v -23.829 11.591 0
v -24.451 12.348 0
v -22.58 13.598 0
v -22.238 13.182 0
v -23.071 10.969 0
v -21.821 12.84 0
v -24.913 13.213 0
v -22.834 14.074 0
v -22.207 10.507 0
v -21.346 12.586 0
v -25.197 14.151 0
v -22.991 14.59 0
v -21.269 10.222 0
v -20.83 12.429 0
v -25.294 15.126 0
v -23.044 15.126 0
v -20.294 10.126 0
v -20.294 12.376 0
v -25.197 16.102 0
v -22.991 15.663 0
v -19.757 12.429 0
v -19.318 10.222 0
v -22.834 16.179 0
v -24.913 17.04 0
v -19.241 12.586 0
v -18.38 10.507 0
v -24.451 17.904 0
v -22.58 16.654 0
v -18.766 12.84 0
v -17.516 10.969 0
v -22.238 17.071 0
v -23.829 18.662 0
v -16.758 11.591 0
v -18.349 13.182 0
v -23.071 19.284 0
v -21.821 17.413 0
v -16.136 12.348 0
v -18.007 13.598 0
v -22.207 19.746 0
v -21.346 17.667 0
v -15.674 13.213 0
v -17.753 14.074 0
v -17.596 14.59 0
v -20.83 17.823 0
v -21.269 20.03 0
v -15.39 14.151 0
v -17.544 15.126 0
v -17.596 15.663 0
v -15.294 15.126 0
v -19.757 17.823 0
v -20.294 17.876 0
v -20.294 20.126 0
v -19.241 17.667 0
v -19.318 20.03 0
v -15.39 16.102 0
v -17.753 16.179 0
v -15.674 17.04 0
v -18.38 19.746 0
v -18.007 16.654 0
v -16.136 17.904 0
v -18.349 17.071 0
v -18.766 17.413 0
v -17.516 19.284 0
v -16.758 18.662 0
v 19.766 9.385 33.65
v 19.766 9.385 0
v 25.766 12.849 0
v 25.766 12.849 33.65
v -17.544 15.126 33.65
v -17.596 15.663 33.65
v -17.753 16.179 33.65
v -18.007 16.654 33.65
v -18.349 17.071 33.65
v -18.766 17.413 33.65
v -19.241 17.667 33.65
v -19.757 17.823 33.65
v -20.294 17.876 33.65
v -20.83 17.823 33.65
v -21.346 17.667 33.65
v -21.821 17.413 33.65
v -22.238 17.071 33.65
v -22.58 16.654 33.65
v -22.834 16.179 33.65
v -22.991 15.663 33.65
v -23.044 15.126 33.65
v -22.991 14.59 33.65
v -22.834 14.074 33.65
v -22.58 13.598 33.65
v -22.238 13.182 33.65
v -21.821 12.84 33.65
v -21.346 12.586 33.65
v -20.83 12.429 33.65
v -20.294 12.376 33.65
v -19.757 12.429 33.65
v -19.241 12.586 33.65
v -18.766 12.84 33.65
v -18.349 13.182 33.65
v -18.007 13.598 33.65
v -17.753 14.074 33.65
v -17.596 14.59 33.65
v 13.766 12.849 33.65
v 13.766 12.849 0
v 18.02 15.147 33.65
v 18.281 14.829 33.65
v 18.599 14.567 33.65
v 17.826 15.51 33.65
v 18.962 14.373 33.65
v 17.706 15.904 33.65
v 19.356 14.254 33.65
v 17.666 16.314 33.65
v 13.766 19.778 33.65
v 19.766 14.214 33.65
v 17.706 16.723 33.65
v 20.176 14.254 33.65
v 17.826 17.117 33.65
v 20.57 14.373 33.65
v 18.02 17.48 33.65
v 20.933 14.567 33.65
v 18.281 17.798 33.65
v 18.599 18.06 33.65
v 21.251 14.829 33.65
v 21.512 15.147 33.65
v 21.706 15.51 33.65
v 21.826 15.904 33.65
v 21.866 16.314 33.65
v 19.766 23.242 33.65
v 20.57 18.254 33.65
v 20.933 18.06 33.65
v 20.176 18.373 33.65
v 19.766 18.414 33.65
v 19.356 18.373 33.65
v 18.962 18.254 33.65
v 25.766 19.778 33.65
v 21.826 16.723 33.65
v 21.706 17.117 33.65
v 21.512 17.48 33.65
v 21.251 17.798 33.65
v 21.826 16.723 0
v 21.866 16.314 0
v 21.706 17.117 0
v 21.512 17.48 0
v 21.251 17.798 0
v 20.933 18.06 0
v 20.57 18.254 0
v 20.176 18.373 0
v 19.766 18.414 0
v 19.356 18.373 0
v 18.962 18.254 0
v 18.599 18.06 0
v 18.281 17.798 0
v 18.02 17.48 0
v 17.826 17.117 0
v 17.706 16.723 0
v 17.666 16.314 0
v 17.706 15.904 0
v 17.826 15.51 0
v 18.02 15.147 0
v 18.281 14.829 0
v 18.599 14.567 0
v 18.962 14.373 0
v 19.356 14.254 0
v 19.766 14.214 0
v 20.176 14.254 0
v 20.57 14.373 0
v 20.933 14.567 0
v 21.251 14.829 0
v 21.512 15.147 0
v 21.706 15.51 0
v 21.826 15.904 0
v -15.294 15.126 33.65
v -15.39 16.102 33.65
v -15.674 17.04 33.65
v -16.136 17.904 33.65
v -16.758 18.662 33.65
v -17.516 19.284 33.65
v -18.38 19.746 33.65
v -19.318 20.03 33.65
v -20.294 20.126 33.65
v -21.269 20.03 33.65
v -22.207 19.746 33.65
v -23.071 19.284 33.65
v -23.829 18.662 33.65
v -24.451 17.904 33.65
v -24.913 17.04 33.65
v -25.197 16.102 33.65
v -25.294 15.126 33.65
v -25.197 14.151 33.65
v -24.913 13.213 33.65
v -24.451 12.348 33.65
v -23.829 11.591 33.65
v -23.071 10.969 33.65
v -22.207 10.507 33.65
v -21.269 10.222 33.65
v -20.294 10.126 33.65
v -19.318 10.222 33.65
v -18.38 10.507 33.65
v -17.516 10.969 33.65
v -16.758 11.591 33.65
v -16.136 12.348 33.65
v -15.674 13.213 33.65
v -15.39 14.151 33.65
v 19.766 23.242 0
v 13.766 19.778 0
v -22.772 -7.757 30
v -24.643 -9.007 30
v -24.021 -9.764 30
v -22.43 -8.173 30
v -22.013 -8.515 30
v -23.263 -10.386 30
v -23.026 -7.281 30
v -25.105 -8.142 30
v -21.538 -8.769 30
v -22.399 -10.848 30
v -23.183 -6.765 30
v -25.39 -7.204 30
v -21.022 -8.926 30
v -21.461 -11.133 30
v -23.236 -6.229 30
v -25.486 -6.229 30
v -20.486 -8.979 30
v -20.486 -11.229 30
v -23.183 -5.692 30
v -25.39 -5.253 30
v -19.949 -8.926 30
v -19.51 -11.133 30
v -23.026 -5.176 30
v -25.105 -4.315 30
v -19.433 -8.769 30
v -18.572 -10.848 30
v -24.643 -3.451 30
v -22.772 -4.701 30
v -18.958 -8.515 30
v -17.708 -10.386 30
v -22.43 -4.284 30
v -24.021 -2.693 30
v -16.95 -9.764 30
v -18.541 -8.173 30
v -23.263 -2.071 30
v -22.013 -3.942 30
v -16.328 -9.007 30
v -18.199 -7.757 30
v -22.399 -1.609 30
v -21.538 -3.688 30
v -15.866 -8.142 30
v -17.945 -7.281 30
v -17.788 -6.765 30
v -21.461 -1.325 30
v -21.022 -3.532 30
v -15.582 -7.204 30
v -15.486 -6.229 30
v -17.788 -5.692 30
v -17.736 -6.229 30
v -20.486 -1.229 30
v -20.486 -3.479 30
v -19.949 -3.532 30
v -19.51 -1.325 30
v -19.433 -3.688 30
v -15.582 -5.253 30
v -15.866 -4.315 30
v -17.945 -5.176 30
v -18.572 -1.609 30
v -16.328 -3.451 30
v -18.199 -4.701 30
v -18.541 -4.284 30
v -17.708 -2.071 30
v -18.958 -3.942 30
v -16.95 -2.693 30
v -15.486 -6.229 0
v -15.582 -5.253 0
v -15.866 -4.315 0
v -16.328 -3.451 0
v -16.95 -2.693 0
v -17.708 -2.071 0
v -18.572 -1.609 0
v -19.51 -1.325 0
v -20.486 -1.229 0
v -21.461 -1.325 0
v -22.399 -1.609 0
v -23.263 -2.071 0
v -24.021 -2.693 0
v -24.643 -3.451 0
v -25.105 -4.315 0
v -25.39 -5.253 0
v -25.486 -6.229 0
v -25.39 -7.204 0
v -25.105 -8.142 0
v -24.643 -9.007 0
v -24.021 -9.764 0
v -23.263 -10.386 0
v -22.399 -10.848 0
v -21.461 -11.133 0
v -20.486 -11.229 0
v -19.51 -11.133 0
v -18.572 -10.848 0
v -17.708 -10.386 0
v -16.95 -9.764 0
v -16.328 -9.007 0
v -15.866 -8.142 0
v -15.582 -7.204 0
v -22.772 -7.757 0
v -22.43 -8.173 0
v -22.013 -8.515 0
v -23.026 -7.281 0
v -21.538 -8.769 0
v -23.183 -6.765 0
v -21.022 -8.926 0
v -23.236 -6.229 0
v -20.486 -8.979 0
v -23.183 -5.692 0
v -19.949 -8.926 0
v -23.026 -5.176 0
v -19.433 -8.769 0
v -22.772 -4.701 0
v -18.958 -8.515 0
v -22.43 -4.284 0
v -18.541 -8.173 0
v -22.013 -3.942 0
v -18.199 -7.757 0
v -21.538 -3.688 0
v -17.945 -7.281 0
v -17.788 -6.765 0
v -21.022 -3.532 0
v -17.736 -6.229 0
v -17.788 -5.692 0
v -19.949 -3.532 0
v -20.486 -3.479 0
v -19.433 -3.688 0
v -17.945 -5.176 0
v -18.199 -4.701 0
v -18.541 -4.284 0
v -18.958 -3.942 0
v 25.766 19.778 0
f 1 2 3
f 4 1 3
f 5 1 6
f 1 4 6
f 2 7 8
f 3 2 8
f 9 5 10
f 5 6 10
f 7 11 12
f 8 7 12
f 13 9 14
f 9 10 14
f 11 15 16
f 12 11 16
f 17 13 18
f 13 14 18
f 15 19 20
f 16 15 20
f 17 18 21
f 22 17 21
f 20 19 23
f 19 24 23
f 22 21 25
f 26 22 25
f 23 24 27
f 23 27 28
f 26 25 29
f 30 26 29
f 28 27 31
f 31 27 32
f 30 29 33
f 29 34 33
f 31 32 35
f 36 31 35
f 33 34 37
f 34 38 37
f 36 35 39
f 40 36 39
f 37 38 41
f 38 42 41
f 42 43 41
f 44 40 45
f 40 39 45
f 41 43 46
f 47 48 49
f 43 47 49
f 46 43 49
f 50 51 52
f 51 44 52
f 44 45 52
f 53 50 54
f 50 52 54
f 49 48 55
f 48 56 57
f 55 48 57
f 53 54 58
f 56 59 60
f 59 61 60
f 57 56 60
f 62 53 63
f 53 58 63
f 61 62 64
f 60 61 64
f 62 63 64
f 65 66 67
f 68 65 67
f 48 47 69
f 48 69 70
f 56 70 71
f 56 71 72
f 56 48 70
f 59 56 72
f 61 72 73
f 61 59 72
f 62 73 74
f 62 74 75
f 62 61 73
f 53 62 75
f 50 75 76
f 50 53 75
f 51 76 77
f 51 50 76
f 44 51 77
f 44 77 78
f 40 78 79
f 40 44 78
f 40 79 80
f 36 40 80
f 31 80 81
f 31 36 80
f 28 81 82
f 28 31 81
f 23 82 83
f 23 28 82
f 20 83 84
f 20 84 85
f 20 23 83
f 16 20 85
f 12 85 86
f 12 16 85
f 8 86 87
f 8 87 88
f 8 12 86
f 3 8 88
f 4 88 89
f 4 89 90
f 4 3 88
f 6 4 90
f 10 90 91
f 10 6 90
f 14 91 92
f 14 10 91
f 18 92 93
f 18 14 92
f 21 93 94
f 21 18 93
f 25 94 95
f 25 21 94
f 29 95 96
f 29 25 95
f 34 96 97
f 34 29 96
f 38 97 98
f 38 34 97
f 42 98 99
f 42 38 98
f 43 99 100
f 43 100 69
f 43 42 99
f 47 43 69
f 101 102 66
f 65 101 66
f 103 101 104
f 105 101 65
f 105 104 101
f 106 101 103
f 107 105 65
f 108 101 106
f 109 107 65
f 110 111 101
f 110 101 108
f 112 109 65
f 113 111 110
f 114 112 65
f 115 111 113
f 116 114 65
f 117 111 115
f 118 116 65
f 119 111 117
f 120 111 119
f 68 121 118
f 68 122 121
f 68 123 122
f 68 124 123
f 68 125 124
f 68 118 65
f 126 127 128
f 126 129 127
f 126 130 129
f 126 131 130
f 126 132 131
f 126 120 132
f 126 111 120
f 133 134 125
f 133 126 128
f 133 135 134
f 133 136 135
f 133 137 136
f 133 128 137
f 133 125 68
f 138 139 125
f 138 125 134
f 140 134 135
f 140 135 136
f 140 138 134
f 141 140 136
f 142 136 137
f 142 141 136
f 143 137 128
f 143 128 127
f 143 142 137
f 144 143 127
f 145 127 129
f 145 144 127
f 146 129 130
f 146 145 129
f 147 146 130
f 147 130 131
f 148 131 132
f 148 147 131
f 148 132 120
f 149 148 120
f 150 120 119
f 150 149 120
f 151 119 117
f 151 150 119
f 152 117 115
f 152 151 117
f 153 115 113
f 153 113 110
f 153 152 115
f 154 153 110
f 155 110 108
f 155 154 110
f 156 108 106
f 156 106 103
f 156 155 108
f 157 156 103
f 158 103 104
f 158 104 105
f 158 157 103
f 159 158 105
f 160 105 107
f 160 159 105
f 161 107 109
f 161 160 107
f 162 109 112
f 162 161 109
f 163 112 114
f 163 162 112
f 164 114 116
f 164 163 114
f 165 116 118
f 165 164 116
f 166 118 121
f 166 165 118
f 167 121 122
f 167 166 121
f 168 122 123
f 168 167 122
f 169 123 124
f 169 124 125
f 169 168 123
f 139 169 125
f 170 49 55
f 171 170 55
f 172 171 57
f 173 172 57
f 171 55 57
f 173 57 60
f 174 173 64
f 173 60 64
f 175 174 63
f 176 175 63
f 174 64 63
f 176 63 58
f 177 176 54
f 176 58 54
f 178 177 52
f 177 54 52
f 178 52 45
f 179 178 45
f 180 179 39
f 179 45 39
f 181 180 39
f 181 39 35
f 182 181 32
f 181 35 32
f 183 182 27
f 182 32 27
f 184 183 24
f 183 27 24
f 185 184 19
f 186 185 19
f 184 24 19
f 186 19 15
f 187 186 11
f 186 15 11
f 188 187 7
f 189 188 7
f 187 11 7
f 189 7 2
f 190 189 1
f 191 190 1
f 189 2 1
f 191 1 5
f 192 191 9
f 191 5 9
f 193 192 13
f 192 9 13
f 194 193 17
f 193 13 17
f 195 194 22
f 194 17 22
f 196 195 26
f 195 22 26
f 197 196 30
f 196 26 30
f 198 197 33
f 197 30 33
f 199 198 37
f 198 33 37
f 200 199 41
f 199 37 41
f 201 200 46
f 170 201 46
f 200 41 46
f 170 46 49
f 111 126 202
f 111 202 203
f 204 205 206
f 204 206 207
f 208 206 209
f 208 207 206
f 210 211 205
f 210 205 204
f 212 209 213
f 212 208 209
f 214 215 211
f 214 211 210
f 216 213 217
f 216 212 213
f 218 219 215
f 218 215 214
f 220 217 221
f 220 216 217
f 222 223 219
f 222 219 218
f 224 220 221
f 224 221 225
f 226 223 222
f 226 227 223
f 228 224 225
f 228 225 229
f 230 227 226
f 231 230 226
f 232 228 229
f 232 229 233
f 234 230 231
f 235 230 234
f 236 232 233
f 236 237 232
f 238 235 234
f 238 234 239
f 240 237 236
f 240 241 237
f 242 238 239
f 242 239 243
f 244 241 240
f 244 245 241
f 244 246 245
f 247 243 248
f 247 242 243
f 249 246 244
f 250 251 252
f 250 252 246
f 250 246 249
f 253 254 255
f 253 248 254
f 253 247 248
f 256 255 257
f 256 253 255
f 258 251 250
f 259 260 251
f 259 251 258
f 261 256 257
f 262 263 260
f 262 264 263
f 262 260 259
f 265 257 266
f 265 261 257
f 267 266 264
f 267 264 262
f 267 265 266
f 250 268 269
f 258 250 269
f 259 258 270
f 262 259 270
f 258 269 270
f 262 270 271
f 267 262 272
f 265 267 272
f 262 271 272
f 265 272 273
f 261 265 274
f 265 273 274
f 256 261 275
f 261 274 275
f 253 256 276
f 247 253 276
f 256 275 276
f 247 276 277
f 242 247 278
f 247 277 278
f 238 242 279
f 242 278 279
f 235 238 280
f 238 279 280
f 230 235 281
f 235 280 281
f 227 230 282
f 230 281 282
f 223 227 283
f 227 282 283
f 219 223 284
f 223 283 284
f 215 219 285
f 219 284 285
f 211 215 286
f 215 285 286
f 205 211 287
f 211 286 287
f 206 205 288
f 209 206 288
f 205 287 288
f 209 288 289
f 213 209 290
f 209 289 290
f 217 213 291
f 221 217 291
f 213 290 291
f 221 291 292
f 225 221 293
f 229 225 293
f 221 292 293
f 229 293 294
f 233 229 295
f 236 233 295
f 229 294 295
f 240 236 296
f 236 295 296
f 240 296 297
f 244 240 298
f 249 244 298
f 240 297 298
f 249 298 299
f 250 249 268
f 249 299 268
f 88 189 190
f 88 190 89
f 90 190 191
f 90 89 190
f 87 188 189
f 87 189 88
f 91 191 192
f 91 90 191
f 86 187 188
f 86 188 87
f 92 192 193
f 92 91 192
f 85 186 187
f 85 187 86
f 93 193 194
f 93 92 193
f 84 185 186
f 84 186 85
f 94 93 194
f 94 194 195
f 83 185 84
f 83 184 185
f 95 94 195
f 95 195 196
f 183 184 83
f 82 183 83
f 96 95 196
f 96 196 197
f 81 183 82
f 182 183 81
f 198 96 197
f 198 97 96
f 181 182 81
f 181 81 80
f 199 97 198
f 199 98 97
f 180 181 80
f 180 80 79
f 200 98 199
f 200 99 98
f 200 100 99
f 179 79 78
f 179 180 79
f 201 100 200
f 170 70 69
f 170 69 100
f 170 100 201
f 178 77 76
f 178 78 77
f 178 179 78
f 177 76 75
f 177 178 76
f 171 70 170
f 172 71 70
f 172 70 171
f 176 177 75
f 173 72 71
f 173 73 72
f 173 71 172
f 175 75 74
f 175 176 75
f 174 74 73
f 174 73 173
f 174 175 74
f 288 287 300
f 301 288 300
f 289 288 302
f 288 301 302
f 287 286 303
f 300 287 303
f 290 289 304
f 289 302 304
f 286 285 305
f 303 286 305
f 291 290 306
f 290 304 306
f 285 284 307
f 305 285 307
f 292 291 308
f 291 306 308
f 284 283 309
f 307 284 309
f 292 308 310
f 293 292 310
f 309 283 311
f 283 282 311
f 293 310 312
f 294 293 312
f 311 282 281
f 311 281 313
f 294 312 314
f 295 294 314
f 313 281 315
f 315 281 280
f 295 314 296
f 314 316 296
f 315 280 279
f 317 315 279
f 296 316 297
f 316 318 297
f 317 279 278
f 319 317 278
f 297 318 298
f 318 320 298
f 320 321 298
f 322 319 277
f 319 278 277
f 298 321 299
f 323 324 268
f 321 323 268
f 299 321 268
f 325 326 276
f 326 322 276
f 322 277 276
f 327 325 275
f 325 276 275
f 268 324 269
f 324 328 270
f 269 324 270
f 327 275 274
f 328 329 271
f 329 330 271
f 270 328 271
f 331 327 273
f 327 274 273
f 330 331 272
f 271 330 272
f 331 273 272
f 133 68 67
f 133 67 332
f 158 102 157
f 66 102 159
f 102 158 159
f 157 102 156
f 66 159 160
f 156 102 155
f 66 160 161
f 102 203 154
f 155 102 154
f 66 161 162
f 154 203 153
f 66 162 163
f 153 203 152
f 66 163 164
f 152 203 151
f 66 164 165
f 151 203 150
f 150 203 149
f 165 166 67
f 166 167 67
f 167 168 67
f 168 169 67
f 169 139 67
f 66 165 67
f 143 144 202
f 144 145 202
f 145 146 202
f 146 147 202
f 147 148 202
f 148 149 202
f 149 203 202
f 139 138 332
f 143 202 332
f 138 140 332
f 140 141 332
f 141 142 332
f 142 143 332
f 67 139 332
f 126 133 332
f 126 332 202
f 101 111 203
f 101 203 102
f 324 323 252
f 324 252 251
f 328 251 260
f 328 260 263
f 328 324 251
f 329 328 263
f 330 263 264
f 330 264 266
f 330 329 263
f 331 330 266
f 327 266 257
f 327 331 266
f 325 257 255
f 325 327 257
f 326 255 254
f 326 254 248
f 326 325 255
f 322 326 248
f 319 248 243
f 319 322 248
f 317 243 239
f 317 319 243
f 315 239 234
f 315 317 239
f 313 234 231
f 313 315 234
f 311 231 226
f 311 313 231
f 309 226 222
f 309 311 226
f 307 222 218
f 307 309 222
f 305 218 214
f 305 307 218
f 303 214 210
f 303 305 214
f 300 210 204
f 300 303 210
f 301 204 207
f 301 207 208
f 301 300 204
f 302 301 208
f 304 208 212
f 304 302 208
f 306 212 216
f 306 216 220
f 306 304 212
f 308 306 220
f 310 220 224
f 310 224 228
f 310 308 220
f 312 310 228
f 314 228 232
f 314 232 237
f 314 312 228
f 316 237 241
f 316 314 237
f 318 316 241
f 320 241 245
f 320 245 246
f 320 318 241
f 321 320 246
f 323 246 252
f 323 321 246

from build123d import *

# Parameters (mm, degrees)
F0_R     = 5
F0_R_2   = 2.75
F1_DEPTH = 33.65
F2_R     = 5
F2_R_2   = 2.75
F3_DEPTH = 30
F4_R     = 2.1
F5_DEPTH = 33.65


with BuildPart() as f1:
    # F0 (on Top) → F1 (new body)
    with BuildSketch(Plane.XY):
        with Locations((-20.293534, 15.126199)):
            Circle(F0_R)
        with Locations((-20.293534, 15.126199)):
            Circle(F0_R_2, mode=Mode.SUBTRACT)
    extrude(amount=F1_DEPTH)


with BuildPart() as f3:
    # F2 (on Top) → F3 (new body)
    with BuildSketch(Plane.XY):
        with Locations((-20.485578, -6.228754)):
            Circle(F2_R)
        with Locations((-20.485578, -6.228754)):
            Circle(F2_R_2, mode=Mode.SUBTRACT)
    extrude(amount=F3_DEPTH)


with BuildPart() as f5:
    # F4 (on Top) → F5 (new body)
    with BuildSketch(Plane.XY):
        Polygon((25.765936, 12.849451), (25.765936, 19.777654), (19.765936, 23.241756), (13.765936, 19.777654), (13.765936, 12.849451), (19.765936, 9.38535), align=None)
        with Locations((19.765936, 16.313553)):
            Circle(F4_R, mode=Mode.SUBTRACT)
    extrude(amount=F5_DEPTH)


solid = Compound([f1.part, f3.part, f5.part])
